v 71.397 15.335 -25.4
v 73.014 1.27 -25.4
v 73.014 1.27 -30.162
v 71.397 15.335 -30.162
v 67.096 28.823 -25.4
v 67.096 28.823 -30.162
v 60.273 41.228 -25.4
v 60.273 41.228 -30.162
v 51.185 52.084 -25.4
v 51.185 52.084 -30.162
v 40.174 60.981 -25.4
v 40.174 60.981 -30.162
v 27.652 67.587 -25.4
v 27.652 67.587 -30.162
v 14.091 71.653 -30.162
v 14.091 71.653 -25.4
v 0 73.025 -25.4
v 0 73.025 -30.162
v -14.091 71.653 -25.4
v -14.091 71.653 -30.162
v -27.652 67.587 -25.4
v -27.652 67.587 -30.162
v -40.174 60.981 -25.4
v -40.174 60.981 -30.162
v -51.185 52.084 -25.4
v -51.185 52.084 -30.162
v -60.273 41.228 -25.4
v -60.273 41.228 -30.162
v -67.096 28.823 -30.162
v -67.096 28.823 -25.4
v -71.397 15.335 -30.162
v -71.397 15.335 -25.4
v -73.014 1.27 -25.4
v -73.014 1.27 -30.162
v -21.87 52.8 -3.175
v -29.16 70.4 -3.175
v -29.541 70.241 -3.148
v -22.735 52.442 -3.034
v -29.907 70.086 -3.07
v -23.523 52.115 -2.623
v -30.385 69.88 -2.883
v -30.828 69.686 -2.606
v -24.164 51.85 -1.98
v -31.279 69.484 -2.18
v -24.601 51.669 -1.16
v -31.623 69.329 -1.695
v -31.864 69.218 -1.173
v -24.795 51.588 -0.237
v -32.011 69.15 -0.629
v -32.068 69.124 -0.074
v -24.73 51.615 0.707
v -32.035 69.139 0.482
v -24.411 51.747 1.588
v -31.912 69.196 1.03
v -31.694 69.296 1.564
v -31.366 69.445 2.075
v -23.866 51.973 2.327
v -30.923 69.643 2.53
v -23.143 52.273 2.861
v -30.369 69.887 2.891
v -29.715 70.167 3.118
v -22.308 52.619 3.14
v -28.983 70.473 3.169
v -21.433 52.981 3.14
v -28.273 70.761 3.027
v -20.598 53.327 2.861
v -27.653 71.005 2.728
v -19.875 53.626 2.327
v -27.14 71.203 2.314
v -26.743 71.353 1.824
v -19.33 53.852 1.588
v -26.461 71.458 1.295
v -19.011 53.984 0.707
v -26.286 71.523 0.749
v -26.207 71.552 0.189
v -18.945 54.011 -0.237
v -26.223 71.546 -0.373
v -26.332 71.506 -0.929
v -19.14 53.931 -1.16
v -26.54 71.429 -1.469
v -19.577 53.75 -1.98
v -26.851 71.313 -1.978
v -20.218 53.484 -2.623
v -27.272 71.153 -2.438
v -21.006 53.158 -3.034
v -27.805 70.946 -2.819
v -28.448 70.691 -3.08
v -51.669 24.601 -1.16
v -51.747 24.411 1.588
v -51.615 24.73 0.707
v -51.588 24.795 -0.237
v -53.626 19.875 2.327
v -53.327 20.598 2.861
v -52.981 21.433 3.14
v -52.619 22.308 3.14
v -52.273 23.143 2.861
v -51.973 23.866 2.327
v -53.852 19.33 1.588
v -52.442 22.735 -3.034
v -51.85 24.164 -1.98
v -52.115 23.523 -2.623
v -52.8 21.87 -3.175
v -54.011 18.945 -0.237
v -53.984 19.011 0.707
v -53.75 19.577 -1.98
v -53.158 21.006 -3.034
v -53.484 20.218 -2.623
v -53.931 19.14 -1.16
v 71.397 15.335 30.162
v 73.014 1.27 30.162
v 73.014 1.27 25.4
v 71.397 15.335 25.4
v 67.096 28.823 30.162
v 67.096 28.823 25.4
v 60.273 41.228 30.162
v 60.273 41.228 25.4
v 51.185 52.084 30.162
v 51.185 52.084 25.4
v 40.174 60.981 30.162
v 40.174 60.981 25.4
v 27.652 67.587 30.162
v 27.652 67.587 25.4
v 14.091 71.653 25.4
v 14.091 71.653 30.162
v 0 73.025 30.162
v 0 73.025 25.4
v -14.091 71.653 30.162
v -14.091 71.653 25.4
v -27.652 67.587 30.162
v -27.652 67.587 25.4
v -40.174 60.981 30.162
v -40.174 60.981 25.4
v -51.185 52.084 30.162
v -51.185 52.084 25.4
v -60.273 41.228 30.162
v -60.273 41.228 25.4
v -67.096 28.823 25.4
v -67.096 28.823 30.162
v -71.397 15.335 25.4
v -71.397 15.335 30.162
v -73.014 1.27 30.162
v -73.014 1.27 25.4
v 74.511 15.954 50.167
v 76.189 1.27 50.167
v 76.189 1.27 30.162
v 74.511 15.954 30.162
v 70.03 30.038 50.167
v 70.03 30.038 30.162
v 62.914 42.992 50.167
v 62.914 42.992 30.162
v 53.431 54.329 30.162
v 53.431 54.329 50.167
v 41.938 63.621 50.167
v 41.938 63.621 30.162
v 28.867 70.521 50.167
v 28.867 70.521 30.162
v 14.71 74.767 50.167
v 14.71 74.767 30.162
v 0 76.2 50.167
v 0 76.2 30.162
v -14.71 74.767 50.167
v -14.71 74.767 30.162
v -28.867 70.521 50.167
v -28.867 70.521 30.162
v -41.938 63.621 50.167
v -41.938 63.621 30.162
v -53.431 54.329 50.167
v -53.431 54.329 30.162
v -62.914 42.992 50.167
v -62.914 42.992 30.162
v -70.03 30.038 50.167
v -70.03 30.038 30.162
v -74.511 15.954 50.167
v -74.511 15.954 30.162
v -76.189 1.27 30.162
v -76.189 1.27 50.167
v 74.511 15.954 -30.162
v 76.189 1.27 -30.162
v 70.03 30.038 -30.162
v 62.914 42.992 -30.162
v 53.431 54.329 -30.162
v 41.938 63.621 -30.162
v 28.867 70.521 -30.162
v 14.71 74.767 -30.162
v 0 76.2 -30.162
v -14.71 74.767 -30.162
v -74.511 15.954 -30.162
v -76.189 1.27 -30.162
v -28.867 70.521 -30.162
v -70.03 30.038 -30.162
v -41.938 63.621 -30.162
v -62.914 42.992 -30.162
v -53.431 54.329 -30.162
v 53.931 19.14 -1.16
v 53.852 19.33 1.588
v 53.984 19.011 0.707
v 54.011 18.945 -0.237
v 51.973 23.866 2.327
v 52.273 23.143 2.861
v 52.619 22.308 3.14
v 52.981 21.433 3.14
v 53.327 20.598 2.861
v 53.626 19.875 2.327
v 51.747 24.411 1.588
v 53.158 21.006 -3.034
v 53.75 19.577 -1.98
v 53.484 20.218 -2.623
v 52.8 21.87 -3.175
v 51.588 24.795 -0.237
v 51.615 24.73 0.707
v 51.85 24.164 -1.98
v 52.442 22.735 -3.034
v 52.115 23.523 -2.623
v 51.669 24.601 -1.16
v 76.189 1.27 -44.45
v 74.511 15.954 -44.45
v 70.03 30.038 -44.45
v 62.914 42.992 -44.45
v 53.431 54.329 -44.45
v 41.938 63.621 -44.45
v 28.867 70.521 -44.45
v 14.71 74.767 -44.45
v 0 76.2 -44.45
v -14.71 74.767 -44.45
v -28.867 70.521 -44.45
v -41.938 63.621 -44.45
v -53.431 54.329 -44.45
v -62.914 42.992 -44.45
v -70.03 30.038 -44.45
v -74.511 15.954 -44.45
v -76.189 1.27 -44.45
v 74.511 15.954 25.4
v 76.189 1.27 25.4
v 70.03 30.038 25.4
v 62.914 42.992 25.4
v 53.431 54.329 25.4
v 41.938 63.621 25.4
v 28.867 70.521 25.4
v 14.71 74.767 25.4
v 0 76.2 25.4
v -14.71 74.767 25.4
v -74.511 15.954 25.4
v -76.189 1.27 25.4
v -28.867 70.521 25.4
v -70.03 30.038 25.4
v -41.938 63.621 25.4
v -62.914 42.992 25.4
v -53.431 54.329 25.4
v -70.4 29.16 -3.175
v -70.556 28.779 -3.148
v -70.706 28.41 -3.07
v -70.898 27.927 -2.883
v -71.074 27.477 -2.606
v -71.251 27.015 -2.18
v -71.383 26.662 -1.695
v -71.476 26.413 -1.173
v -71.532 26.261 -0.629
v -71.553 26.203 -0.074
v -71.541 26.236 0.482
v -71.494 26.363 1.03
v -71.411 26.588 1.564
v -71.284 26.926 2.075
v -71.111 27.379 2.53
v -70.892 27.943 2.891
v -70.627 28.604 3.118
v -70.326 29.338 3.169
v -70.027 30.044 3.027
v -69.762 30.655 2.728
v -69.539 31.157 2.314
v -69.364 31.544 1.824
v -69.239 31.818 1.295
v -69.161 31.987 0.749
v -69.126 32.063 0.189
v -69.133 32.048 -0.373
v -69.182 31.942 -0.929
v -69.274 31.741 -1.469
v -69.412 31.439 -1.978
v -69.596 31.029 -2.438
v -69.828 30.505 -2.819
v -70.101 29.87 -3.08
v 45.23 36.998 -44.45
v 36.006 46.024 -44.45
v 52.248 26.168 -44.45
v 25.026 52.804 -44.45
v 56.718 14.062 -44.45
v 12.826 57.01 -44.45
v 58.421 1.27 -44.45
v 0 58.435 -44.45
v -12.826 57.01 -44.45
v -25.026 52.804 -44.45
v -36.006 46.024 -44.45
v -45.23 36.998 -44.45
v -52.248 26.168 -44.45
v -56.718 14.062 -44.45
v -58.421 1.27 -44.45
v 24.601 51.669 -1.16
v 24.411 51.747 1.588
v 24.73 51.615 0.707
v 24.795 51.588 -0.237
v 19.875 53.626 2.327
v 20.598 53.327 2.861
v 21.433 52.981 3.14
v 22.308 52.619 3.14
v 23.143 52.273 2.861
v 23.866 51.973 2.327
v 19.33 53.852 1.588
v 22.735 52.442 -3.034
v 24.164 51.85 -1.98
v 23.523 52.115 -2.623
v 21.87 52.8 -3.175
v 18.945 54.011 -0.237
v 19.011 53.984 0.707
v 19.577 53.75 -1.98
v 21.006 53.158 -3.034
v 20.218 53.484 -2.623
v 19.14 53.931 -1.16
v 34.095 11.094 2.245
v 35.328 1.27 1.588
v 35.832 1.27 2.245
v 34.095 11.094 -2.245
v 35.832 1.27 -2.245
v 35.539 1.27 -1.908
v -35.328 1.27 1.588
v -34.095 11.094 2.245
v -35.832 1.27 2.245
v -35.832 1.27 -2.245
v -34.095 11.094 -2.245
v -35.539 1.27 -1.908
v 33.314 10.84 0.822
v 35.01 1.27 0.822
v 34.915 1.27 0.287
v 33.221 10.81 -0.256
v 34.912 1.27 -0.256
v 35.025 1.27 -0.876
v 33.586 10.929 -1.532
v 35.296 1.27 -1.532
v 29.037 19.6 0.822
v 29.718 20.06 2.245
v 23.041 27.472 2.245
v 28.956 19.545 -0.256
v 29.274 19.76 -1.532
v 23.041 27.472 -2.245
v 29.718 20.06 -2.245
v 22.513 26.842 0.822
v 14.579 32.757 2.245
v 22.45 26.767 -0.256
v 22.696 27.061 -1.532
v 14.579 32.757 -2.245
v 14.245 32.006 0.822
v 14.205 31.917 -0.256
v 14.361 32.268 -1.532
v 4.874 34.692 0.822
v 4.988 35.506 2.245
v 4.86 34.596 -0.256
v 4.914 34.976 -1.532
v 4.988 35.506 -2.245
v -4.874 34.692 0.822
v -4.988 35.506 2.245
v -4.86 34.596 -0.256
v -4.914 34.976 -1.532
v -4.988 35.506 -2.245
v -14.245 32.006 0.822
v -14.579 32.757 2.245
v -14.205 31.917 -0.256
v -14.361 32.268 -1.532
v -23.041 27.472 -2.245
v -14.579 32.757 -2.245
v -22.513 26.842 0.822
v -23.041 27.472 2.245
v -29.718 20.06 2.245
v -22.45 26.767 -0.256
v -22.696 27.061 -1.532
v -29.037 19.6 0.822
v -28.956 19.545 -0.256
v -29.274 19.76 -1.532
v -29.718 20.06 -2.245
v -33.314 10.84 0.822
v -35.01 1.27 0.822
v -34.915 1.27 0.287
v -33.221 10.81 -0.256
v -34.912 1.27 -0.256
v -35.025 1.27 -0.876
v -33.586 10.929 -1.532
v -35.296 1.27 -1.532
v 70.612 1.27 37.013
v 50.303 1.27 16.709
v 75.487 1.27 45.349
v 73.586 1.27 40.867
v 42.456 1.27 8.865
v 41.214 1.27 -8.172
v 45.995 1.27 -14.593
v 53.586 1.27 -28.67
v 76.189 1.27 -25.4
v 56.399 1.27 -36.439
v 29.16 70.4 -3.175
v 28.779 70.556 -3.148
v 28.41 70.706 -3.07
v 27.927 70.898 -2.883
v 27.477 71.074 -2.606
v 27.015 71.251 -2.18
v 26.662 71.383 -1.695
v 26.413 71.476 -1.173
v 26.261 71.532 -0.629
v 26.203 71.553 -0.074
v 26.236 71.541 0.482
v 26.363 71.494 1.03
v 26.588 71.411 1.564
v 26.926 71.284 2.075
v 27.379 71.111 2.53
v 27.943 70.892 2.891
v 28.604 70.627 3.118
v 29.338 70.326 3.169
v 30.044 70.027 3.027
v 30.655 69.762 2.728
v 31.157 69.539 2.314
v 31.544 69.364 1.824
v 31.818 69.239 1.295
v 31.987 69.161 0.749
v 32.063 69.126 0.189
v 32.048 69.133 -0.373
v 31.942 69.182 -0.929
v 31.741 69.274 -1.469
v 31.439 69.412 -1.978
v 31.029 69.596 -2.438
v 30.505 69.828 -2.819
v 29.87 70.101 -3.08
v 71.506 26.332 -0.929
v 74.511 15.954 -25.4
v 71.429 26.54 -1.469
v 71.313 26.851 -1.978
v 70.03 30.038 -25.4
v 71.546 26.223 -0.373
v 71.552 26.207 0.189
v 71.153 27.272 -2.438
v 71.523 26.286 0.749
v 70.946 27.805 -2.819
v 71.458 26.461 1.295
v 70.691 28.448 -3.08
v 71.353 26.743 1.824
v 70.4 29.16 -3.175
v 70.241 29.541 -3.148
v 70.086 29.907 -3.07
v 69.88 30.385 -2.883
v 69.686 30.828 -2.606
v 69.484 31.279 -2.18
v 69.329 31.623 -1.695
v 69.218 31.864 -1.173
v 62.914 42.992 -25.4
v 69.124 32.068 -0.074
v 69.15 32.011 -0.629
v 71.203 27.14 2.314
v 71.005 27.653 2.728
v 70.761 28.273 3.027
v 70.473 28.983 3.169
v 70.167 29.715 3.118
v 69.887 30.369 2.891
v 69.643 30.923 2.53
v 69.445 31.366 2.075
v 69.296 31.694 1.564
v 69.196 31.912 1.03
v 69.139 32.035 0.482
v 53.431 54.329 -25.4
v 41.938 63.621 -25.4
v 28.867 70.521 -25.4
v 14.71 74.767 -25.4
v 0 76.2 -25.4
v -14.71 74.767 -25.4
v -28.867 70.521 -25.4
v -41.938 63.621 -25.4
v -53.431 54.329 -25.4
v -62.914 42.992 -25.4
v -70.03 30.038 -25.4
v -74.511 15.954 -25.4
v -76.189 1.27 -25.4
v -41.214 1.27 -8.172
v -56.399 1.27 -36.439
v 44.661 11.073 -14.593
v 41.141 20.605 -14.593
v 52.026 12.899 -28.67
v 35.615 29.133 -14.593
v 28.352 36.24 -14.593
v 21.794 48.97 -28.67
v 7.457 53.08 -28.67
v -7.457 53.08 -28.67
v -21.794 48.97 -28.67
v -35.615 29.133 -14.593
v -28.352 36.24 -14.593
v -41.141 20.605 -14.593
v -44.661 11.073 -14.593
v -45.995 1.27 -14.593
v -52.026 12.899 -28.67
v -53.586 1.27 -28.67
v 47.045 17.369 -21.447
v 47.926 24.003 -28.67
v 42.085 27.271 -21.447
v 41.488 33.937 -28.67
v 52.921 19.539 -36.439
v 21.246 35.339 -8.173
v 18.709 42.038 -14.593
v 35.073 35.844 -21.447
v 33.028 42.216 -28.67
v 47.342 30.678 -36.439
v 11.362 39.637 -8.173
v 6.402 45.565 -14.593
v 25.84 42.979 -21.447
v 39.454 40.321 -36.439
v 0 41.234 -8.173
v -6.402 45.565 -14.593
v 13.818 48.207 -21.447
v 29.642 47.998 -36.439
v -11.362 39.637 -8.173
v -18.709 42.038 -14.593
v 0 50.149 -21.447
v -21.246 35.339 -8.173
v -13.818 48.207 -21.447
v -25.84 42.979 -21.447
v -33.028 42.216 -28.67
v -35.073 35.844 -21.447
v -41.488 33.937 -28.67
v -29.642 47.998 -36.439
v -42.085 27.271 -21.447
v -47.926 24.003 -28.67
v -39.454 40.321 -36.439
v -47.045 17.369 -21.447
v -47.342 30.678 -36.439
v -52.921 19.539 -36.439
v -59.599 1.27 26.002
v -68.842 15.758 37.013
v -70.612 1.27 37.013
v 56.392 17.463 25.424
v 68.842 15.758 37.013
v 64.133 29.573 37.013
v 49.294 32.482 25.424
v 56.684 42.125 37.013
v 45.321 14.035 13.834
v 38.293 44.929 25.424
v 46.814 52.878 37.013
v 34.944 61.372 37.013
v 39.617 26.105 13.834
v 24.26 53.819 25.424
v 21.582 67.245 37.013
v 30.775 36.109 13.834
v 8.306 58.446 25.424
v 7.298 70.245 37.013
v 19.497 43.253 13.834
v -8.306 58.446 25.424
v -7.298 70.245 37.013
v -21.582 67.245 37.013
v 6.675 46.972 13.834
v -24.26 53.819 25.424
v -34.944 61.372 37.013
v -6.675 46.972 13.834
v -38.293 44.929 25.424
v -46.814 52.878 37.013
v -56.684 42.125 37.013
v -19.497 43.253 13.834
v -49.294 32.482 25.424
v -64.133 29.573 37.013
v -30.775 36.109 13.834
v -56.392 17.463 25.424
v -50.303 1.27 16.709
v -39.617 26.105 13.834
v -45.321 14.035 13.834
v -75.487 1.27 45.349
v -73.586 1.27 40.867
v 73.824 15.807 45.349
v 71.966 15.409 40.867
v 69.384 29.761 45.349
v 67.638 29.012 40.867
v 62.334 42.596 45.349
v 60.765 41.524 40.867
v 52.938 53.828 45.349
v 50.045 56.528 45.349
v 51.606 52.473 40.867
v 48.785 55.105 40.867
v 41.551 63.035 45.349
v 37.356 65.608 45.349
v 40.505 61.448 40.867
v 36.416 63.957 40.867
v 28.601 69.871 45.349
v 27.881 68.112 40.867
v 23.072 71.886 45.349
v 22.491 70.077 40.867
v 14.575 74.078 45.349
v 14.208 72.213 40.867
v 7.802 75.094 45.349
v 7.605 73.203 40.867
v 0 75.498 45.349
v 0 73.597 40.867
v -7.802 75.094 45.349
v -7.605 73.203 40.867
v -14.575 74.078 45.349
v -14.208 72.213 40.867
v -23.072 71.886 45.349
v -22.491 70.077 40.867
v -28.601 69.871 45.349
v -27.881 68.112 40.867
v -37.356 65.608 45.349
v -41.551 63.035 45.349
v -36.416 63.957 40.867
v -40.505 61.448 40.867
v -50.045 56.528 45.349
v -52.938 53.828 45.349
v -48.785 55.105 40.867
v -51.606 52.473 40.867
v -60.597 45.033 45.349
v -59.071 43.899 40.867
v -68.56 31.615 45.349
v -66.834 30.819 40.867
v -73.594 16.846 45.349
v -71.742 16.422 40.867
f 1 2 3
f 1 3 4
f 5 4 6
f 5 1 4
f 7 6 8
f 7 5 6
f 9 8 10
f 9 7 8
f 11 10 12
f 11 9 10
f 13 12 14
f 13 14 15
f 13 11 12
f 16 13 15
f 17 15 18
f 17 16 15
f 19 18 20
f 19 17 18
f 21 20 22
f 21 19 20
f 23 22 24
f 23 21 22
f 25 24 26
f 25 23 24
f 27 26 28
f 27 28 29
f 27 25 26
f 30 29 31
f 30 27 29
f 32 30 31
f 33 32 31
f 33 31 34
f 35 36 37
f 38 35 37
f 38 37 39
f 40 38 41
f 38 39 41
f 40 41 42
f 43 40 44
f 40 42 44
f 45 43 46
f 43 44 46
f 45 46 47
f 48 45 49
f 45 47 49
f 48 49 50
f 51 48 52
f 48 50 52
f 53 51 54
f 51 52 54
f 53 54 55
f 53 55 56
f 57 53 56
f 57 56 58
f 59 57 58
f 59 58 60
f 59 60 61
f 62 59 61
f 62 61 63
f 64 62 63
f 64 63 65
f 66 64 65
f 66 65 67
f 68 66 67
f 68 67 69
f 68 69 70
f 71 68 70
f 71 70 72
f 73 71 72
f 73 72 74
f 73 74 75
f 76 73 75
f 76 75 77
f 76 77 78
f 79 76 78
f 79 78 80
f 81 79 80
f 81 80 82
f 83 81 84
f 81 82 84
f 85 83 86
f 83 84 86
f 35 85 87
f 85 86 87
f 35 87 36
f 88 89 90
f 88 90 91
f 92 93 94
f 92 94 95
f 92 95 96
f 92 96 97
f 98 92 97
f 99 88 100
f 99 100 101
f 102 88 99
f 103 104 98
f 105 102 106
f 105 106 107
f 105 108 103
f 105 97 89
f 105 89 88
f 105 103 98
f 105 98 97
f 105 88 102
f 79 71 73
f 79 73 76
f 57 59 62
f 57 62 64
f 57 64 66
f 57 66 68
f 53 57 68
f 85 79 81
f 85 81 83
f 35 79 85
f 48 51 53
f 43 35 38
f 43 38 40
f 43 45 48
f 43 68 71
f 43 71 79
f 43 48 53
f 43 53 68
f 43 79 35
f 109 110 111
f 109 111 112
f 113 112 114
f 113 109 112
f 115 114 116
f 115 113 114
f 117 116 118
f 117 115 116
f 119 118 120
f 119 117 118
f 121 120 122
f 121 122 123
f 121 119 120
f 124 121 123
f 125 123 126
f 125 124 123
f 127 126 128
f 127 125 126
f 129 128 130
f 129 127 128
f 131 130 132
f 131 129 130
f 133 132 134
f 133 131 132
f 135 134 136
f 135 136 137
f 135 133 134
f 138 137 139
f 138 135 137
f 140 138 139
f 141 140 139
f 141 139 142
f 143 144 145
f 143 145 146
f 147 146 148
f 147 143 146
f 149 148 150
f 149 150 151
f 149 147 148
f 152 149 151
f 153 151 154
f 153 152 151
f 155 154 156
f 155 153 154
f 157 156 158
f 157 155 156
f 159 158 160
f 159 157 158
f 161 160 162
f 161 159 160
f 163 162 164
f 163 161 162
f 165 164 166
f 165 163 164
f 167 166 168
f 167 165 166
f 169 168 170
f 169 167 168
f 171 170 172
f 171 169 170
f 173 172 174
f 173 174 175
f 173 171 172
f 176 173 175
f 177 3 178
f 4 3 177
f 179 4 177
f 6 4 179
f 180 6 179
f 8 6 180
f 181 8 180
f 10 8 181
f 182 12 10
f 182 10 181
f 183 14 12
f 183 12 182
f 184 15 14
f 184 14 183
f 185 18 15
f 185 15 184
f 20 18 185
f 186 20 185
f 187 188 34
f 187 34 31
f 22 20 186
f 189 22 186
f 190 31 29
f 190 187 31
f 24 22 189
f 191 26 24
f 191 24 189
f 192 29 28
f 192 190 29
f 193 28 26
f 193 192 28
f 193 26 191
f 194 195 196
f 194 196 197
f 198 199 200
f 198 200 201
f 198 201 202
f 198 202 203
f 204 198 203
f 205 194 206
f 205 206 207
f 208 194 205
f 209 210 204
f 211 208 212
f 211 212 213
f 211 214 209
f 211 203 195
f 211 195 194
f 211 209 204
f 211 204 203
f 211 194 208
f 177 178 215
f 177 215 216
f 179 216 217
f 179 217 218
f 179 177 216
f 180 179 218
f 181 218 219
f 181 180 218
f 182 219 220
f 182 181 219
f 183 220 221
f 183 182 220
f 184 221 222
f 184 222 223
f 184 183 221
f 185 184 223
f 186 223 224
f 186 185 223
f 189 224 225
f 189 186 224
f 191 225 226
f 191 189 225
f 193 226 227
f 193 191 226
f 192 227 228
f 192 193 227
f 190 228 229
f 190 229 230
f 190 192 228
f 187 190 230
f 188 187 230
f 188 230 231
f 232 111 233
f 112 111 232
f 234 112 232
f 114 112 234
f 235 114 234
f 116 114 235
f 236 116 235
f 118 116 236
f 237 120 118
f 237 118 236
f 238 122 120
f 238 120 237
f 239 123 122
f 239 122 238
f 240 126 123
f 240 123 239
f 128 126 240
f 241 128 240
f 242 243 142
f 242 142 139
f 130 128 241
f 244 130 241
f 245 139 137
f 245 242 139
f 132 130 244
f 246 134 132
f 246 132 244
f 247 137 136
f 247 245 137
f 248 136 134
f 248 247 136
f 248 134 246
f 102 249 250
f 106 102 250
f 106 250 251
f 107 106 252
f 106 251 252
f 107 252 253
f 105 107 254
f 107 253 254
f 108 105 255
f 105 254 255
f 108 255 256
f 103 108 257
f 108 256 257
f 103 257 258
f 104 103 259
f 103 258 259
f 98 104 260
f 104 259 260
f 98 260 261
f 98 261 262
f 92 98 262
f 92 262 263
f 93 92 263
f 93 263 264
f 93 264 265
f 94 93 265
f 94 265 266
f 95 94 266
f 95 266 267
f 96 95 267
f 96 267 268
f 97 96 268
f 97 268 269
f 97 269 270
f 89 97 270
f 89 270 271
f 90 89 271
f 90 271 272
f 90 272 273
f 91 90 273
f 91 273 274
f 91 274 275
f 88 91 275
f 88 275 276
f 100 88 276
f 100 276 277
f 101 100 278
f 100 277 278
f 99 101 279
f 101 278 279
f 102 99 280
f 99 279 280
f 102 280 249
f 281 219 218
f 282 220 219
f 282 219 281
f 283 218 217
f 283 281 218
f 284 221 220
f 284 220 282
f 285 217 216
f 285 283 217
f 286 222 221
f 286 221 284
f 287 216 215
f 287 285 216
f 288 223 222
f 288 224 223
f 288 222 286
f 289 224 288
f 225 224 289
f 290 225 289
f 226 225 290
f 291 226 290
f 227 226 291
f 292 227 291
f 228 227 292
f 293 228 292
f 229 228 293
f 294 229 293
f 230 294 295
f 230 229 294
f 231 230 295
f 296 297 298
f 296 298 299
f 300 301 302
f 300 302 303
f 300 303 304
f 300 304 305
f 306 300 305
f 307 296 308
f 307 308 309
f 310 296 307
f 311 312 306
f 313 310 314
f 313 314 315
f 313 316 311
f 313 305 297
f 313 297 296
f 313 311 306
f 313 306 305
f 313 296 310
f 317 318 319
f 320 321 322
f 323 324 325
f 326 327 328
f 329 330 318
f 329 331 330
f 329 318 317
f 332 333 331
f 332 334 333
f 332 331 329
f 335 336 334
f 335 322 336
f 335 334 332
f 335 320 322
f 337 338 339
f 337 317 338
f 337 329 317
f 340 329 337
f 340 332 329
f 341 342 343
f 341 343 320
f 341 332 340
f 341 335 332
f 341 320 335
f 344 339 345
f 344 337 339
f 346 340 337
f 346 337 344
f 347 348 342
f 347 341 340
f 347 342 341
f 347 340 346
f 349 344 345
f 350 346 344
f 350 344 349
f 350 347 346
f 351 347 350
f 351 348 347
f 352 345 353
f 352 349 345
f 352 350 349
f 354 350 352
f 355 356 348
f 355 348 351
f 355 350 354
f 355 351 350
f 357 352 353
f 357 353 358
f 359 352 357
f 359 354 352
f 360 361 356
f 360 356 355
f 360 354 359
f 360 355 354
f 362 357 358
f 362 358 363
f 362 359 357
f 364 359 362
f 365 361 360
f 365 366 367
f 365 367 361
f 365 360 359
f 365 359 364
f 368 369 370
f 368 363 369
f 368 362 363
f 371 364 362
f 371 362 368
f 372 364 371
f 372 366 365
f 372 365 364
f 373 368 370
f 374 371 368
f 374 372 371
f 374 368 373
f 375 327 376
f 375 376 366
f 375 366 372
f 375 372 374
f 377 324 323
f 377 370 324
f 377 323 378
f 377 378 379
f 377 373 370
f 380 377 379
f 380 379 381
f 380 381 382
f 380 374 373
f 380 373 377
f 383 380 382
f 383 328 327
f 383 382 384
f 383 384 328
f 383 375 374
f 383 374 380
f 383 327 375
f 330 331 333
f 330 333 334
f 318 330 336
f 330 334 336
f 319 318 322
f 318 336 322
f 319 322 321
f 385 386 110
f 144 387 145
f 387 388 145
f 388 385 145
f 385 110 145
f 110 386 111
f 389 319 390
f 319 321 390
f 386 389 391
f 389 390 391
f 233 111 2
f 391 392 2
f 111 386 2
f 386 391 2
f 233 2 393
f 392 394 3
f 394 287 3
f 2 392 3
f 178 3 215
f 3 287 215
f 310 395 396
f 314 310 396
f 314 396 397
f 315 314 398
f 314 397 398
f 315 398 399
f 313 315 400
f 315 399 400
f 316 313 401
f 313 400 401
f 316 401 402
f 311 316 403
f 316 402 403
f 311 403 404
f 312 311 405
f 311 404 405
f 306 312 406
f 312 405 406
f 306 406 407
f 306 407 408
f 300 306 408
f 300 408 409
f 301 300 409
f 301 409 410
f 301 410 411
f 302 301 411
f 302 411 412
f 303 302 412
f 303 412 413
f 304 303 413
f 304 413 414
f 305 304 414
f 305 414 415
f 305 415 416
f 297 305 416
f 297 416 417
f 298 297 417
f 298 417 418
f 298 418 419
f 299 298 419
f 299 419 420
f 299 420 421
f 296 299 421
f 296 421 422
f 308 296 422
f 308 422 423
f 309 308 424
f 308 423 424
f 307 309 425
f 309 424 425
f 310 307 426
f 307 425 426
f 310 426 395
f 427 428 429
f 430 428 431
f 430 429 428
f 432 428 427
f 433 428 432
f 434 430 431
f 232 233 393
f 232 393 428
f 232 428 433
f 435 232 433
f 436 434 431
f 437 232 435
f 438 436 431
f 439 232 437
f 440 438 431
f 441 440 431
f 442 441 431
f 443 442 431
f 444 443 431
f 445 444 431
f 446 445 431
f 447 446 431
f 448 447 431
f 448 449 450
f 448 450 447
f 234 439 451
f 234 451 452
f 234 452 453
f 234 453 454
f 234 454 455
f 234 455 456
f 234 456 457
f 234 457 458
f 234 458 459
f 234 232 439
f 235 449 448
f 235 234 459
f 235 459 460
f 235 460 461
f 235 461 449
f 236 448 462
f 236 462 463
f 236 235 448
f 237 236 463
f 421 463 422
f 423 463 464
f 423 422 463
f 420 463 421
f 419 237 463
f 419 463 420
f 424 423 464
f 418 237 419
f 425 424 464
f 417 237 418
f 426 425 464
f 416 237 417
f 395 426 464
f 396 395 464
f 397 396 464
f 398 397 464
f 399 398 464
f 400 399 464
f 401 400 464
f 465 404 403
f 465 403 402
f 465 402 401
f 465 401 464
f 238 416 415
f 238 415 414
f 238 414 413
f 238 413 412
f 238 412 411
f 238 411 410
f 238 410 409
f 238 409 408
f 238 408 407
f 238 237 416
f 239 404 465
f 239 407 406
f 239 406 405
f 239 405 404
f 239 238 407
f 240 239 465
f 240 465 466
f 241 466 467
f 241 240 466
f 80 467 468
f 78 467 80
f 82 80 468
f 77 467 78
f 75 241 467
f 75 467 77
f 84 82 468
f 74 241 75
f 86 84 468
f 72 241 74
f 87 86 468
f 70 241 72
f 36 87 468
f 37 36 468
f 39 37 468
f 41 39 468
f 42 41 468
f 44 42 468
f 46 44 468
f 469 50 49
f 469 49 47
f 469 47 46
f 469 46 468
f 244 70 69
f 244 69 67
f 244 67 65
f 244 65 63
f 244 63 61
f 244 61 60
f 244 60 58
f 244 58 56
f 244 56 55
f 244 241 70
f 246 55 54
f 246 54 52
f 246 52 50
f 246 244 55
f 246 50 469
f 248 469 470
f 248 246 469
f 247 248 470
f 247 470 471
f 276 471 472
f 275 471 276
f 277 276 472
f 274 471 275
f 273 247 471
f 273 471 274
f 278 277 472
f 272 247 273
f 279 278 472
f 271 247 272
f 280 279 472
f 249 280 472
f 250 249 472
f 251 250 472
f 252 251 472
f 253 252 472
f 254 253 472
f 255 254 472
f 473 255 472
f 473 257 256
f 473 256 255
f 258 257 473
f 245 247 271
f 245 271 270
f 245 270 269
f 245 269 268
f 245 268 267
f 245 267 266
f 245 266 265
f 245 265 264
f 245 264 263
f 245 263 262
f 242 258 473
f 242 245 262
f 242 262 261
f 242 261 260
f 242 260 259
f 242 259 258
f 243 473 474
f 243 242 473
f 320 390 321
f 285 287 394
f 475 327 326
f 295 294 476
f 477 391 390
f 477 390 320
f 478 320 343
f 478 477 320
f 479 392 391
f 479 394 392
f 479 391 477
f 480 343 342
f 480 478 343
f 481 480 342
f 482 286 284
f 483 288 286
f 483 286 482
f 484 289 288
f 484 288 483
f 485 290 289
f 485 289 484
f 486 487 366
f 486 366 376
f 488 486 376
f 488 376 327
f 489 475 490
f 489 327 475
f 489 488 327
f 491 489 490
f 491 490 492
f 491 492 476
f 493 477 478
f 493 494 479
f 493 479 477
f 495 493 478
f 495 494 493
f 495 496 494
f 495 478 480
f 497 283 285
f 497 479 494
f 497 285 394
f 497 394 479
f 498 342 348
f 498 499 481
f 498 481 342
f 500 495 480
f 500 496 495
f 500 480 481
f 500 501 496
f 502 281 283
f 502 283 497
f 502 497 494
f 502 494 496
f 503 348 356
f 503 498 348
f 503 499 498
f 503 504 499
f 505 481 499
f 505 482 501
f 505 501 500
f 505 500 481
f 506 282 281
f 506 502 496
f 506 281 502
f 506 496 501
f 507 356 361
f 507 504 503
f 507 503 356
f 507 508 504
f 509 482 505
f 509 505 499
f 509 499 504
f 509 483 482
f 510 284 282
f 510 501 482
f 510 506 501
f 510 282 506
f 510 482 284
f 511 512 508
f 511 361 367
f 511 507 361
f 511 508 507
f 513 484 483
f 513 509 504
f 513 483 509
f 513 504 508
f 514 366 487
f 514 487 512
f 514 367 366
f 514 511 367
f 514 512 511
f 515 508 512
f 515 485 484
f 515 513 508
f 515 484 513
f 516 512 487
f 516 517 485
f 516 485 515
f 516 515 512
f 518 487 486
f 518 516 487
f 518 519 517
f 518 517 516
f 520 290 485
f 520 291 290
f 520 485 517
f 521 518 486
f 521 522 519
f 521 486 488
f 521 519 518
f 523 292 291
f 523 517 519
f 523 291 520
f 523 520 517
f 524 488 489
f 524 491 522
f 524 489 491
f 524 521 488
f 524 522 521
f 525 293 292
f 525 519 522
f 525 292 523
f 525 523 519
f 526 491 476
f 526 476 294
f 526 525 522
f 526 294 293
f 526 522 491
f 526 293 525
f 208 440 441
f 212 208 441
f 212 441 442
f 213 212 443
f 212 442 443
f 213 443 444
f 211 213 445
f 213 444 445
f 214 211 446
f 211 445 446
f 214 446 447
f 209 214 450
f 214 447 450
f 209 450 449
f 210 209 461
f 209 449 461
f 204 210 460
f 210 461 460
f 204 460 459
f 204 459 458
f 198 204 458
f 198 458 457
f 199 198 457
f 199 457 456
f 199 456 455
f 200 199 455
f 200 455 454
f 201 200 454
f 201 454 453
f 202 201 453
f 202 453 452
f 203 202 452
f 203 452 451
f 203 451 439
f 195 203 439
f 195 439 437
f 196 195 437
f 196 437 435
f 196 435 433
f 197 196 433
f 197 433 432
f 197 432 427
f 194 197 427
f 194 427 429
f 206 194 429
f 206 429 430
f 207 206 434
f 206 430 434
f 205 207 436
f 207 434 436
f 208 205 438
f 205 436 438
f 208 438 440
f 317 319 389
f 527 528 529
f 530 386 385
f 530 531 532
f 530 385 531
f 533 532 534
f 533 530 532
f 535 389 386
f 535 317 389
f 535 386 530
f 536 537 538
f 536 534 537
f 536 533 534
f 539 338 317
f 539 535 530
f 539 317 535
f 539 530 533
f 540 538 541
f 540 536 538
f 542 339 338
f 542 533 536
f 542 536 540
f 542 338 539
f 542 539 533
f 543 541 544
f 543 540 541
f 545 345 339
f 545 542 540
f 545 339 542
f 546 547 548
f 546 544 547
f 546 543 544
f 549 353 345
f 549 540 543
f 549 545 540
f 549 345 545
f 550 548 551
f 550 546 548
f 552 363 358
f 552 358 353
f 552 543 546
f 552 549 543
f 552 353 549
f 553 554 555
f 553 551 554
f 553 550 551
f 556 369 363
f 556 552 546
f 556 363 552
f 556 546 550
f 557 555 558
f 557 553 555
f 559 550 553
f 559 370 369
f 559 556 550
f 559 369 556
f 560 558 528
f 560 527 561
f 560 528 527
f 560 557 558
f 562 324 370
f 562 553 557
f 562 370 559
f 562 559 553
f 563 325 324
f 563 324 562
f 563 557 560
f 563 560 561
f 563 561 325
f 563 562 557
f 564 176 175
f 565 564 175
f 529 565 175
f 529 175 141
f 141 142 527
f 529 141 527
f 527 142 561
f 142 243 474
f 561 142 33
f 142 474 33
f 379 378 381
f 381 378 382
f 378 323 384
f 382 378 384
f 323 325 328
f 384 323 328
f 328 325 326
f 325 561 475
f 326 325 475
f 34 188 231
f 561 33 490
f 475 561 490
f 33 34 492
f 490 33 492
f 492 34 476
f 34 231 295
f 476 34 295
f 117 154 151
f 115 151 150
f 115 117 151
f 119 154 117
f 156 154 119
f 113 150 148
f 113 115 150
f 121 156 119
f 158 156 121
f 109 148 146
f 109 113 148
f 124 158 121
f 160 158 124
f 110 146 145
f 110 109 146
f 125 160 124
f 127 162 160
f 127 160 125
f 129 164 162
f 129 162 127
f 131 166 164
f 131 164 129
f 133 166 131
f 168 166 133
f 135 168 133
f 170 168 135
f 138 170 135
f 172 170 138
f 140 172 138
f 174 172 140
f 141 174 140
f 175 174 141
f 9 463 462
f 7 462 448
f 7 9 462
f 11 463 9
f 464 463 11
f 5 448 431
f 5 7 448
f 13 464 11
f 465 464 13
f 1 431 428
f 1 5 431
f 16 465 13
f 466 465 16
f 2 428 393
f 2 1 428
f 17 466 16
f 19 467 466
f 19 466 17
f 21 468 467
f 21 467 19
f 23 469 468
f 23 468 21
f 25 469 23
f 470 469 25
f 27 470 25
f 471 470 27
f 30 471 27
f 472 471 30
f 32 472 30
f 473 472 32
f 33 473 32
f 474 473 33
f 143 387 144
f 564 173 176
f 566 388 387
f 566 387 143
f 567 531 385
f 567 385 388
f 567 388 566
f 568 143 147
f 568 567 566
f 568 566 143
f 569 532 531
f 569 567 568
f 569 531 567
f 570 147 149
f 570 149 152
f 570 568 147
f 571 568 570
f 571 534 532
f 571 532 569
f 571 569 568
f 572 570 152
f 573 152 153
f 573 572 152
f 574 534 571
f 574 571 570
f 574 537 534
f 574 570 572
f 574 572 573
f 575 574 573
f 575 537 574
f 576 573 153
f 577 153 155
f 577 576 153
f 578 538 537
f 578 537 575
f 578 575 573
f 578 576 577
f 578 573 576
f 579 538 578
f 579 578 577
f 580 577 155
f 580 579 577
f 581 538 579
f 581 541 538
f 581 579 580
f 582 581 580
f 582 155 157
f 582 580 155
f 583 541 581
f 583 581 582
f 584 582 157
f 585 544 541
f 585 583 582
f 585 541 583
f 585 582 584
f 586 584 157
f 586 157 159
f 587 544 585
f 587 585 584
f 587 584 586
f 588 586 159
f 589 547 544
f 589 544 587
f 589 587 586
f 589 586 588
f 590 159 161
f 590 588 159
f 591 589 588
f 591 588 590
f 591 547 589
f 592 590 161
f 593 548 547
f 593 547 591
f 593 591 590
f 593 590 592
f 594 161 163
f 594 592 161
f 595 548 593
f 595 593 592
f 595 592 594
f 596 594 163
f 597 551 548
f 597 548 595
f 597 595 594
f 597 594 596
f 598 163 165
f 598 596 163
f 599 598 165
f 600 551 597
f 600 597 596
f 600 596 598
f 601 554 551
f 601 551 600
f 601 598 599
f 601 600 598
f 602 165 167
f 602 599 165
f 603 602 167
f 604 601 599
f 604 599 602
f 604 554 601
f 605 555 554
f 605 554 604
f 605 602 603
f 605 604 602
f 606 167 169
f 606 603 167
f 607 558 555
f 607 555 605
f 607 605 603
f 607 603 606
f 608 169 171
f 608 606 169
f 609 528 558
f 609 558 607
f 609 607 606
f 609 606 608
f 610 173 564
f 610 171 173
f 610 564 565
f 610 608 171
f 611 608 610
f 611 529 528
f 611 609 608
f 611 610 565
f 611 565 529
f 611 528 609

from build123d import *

# Parameters (mm, degrees)
SKETCH2_W               = 316.892468242
SKETCH2_H               = 286.660554426
CUT_EXTRUDE1_DEPTH      = 1.27
CUT_EXTRUDE1_DEPTH_BACK = 77.2
SKETCH3_R               = 3.175
CUT_EXTRUDE2_DEPTH      = 19.05
CIRPATTERN1_COUNT       = 8


with BuildPart() as part:
    # Sketch1 → Revolve1 (revolve)
    with BuildSketch(Plane(origin=(0, 0, 0), x_dir=(0, 0, -1), z_dir=(1, 0, 0))):
        with BuildLine():
            ThreePointArc((-50.167050753, 76.2), (-43.047460251, 74.691369941), (-37.013141195, 70.623013134))
            Line((-37.013141195, 70.623013134), (-2.24506403, 35.85493597))
            ThreePointArc((-2.24506403, 35.85493597), (0, 34.925), (2.24506403, 35.85493597))
            ThreePointArc((2.24506403, 35.85493597), (21.675043526, 50.270960023), (44.45, 58.434734291))
            Line((44.45, 58.434734291), (44.45, 76.2))
            Line((44.45, 76.2), (30.1625, 76.2))
            Line((30.1625, 76.2), (30.1625, 73.025))
            Line((30.1625, 73.025), (25.4, 73.025))
            Line((25.4, 73.025), (25.4, 76.2))
            Line((25.4, 76.2), (-25.4, 76.2))
            Line((-25.4, 76.2), (-25.4, 73.025))
            Line((-25.4, 73.025), (-30.1625, 73.025))
            Line((-30.1625, 73.025), (-30.1625, 76.2))
            Line((-30.1625, 76.2), (-50.167050753, 76.2))
        make_face()
    revolve(axis=Axis((0, 0, 0), (0, 0, 1)))

    # Sketch2 → Cut-Extrude1 (cut, two sides)
    with BuildSketch(Plane(origin=(0, 0, 0), x_dir=(1, 0, 0), z_dir=(0, 1, 0))) as cut_extrude1_sk:
        Rectangle(SKETCH2_W, SKETCH2_H)
    extrude(amount=CUT_EXTRUDE1_DEPTH, mode=Mode.SUBTRACT)
    extrude(cut_extrude1_sk.sketch, amount=-CUT_EXTRUDE1_DEPTH_BACK, mode=Mode.SUBTRACT)

    # Sketch3 → Cut-Extrude2 (cut)
    with BuildSketch(Plane(origin=(29.160477546, 70.399620377, 0), x_dir=(0, 0, -1), z_dir=(0.382683432, 0.923879533, 0))):
        Circle(SKETCH3_R)
    cut_extrude2 = extrude(amount=-CUT_EXTRUDE2_DEPTH, mode=Mode.SUBTRACT)

    # CirPattern1: Cut-Extrude2 ×8 about axis
    cirpattern1_axis = Axis((0, 0, 0), (0, 0, 1))
    for i in range(1, CIRPATTERN1_COUNT):
        add(cut_extrude2.rotate(cirpattern1_axis, i * 360 / CIRPATTERN1_COUNT), mode=Mode.SUBTRACT)


solid = part.part
